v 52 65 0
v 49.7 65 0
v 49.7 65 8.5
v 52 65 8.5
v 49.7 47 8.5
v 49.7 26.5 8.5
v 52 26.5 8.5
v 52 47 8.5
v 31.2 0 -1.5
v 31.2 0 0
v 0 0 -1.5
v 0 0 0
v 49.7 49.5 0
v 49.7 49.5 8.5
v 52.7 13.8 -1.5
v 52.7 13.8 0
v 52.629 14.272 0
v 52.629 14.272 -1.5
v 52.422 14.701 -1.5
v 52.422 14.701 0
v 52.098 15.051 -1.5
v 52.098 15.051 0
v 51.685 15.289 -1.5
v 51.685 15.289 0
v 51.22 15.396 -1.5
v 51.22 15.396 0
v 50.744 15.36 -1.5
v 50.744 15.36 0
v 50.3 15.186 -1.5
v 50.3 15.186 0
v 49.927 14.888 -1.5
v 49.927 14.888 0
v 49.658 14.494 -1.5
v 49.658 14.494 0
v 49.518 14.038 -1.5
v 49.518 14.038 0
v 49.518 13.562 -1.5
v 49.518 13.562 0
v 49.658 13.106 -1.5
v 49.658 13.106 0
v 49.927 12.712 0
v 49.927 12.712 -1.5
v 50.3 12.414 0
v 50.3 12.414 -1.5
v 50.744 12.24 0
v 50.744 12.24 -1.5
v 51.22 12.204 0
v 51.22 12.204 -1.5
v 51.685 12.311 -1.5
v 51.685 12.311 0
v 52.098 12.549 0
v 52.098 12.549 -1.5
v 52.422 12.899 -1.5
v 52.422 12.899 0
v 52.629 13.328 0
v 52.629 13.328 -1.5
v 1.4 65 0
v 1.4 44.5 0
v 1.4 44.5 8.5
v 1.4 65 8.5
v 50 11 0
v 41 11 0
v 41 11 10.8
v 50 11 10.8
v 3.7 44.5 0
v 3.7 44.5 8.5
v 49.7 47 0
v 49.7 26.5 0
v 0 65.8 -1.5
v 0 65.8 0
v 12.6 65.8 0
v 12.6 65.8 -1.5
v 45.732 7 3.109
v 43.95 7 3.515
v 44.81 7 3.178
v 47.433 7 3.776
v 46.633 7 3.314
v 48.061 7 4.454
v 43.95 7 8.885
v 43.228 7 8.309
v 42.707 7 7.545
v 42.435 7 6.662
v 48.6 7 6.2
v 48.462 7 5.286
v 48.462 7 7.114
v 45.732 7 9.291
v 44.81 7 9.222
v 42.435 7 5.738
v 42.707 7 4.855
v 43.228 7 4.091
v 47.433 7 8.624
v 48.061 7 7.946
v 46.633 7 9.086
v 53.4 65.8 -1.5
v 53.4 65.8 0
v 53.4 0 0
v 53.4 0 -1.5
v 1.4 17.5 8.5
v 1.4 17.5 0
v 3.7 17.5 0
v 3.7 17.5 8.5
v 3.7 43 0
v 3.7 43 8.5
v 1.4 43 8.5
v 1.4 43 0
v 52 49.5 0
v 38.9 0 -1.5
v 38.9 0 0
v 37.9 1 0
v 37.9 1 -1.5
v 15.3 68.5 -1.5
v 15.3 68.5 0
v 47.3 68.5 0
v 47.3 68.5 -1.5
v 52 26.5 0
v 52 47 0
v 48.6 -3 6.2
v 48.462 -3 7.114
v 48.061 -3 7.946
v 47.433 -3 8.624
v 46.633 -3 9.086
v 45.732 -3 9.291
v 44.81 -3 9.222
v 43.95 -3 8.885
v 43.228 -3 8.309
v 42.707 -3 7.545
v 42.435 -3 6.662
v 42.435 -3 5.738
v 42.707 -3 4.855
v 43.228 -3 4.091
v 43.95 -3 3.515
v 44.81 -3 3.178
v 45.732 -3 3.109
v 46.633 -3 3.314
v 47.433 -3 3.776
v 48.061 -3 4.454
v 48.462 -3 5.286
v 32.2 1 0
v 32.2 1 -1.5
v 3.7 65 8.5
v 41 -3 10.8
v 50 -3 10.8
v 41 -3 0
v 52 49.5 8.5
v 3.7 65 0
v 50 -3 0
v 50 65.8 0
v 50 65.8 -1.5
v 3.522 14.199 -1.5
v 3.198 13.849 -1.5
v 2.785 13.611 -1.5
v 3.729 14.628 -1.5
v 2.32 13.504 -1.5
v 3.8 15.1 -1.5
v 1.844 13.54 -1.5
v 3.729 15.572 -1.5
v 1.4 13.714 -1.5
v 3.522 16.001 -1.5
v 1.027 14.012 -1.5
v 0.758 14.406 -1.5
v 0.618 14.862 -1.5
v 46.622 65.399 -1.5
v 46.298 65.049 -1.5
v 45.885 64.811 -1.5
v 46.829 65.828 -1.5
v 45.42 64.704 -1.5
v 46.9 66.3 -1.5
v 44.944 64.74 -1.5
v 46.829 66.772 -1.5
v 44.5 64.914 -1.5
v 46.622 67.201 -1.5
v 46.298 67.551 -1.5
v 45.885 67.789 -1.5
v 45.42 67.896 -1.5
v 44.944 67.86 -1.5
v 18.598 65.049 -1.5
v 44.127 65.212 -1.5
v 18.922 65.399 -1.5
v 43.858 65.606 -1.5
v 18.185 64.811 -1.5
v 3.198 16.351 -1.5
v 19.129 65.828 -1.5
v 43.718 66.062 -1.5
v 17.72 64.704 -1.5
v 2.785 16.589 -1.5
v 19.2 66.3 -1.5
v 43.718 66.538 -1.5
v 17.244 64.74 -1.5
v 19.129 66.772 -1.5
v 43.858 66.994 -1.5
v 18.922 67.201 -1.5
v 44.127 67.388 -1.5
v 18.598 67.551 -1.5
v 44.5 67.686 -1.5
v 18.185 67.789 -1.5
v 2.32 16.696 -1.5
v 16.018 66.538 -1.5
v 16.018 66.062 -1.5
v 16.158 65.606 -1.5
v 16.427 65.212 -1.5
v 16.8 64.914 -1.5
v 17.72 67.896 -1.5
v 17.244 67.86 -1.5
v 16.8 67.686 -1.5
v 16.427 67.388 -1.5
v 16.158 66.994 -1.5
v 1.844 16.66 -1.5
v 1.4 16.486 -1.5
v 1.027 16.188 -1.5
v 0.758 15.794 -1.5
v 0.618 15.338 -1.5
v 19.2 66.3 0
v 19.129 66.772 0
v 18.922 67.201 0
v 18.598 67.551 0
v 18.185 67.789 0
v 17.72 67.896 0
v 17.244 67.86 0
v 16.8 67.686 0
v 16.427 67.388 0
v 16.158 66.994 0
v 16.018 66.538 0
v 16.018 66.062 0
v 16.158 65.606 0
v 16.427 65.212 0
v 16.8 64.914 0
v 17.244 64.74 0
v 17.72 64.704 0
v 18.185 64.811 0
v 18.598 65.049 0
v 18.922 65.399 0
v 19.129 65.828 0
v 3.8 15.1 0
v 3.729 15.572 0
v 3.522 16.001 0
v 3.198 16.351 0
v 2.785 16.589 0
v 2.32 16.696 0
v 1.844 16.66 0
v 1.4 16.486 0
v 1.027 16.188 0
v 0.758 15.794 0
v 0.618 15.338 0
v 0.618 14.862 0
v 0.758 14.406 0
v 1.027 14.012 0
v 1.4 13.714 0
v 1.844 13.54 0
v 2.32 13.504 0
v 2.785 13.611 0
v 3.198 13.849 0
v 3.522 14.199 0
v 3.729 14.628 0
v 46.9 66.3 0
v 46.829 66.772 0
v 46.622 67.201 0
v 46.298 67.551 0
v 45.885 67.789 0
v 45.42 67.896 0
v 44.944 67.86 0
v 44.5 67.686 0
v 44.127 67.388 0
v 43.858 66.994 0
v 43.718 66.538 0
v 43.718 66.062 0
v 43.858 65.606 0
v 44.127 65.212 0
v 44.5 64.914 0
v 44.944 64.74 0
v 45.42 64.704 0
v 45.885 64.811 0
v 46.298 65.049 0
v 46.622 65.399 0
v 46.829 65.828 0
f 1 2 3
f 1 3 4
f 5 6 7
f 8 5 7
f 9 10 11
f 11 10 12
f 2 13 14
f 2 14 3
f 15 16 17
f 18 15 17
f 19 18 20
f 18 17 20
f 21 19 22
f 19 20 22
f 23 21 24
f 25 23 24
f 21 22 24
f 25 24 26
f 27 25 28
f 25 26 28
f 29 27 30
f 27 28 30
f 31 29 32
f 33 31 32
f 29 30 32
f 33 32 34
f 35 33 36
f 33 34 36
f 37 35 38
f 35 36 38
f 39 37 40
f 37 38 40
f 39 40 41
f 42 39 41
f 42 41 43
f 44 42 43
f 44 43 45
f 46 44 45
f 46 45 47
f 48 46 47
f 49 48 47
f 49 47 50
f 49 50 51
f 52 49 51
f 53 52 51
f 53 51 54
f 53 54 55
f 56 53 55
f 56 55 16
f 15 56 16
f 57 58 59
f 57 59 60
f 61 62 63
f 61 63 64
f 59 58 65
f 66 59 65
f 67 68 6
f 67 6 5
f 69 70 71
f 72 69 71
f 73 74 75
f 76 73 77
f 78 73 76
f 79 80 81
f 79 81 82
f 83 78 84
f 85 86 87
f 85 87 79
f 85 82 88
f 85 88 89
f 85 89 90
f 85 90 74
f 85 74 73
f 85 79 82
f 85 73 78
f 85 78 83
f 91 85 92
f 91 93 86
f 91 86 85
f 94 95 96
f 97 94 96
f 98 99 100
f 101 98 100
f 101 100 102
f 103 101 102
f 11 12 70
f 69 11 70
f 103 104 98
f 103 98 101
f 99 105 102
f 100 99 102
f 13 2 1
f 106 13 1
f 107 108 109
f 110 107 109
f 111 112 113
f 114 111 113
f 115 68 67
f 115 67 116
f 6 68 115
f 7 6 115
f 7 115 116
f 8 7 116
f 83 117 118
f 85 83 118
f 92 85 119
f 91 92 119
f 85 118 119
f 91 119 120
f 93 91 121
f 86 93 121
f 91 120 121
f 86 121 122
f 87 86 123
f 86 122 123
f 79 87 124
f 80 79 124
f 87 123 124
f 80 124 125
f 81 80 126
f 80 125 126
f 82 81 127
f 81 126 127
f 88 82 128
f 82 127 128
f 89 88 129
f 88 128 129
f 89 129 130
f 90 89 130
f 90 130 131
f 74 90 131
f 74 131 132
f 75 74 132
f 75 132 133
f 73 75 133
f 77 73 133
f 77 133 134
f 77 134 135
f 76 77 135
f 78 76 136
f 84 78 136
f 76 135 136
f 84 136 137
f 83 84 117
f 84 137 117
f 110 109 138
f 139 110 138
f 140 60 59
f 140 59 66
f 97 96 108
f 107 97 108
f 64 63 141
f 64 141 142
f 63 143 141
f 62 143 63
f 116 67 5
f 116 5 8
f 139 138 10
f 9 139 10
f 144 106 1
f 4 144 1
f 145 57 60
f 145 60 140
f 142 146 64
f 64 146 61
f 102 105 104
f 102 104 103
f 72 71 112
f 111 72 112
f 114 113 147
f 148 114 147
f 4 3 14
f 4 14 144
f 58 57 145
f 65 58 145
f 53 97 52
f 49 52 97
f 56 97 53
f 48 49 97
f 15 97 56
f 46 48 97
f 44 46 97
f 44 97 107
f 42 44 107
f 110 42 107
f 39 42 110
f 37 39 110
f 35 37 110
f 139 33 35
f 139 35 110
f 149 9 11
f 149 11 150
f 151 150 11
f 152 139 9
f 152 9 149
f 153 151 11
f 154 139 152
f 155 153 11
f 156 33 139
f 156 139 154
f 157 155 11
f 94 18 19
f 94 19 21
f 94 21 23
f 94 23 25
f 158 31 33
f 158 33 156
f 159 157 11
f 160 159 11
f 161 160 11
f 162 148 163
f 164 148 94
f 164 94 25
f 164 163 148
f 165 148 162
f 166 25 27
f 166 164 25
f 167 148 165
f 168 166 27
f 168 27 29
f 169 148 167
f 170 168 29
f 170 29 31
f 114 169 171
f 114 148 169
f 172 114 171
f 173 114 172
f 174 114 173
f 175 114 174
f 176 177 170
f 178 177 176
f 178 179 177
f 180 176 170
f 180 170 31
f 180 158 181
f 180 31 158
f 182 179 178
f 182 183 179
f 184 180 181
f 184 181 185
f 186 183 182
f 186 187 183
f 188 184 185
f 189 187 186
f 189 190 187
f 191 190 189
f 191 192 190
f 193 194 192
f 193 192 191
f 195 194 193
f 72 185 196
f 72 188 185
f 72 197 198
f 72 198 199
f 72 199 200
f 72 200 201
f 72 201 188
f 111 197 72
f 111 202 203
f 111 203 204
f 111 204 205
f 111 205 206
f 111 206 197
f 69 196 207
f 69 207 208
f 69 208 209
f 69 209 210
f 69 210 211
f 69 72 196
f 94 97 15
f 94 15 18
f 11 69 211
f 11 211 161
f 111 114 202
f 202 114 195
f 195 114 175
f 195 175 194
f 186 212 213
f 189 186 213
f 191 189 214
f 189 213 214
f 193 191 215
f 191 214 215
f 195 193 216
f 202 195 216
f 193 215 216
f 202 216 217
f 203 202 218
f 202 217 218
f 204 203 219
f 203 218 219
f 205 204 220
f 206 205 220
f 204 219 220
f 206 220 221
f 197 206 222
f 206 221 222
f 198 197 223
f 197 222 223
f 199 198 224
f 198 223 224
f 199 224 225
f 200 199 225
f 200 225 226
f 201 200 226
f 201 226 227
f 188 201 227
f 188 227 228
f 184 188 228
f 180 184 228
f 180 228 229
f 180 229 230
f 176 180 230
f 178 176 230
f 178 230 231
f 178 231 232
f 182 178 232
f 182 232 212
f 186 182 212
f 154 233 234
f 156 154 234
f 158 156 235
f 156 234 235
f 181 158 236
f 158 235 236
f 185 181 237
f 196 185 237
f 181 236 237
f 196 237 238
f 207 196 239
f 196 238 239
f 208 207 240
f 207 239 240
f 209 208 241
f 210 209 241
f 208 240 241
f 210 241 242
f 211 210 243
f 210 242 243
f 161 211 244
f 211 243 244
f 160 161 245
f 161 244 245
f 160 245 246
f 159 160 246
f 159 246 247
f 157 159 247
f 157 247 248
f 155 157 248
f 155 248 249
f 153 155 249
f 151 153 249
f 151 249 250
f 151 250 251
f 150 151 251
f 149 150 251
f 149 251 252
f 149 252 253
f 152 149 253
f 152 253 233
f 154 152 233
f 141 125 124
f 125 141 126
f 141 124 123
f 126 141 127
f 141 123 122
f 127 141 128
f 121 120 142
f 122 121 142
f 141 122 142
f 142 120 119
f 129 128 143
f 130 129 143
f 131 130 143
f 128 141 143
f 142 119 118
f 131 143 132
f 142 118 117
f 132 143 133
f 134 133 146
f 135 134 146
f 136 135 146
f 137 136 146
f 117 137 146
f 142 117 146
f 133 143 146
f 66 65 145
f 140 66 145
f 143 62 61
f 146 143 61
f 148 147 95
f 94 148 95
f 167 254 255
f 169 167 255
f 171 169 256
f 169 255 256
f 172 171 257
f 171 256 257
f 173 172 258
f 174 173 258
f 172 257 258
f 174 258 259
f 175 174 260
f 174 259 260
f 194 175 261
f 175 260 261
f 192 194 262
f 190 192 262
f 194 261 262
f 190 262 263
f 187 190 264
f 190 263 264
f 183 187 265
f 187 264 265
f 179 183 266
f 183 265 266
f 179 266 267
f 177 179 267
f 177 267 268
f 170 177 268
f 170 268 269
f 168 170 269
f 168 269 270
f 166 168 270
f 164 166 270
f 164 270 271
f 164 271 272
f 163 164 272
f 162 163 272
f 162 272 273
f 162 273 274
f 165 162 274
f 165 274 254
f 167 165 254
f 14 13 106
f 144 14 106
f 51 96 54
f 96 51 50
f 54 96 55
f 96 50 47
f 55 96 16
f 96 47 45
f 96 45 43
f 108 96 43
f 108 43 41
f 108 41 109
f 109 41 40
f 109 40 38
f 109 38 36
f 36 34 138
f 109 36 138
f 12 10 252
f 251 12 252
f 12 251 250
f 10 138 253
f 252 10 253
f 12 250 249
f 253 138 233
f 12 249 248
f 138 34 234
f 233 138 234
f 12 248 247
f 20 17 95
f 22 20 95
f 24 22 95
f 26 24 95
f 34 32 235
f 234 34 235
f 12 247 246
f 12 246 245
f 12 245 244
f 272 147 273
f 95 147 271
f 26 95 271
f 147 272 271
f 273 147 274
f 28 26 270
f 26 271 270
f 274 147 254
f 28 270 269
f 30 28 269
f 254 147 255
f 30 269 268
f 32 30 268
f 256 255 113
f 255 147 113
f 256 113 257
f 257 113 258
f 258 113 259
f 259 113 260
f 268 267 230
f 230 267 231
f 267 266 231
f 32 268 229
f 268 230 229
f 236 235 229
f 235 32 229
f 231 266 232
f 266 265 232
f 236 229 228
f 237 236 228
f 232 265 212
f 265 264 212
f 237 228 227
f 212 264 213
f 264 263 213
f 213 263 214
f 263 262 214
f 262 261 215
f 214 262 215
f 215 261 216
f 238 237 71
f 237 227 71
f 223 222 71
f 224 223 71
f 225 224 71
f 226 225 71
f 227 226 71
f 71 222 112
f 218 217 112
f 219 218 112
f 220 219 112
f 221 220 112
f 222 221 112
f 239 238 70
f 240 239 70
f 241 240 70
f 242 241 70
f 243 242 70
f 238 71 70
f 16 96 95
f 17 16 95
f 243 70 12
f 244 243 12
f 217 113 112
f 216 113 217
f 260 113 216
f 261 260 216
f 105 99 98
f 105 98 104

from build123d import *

# Parameters (mm, degrees)
PAD_DEPTH       = 1.5
SKETCH001_R     = 1.6
POCKET_DEPTH    = 1.501
SKETCH002_W     = 9
SKETCH002_H     = 14
PAD001_DEPTH    = 10.8
SKETCH003_R     = 3.1
POCKET001_DEPTH = 10
SKETCH004_W     = 2.3
SKETCH004_H     = 20.5
PAD002_DEPTH    = 8.5
SKETCH005_W     = 2.3
SKETCH005_H     = 25.5
PAD003_DEPTH    = 8.5
SKETCH006_W     = 2.3
SKETCH006_H     = 15.5
PAD004_DEPTH    = 8.5
SKETCH007_W     = 2.3
SKETCH007_H     = 20.5
PAD005_DEPTH    = 8.5


with BuildPart() as mainboard:
    # Sketch → Pad (new body)
    with BuildSketch(Plane.XY):
        Polygon((53.4, 65.8), (53.4, 0), (38.9, 0), (37.9, 1), (32.2, 1), (31.2, 0), (0, 0), (0, 65.8), (12.6, 65.8), (15.3, 68.5), (47.3, 68.5), (50, 65.8), align=None)
    extrude(amount=-PAD_DEPTH)

    # Sketch001 → Pocket (cut, through all)
    with BuildSketch(Plane.XY):
        with Locations((17.6, 66.3)):
            Circle(SKETCH001_R)
        with Locations((45.3, 66.3)):
            Circle(SKETCH001_R)
        with Locations((2.2, 15.1)):
            Circle(SKETCH001_R)
        with Locations((51.1, 13.8)):
            Circle(SKETCH001_R)
    extrude(amount=-POCKET_DEPTH, mode=Mode.SUBTRACT)


with BuildPart() as powerbarrel:
    # Sketch002 → Pad001 (new body)
    with BuildSketch(Plane.XY):
        with Locations((45.5, 4)):
            Rectangle(SKETCH002_W, SKETCH002_H)
    extrude(amount=PAD001_DEPTH)

    # Sketch003 (on Face3 of Pad001) → Pocket001 (cut)
    with BuildSketch(Plane.XZ.offset(3)):
        with Locations((45.5, 6.2)):
            Circle(SKETCH003_R)
    extrude(amount=-POCKET001_DEPTH, mode=Mode.SUBTRACT)


with BuildPart() as header1:
    # Sketch004 → Pad002 (new body)
    with BuildSketch(Plane.XY):
        with Locations((2.55, 54.75)):
            Rectangle(SKETCH004_W, SKETCH004_H)
    extrude(amount=PAD002_DEPTH)


with BuildPart() as header2:
    # Sketch005 → Pad003 (new body)
    with BuildSketch(Plane.XY):
        with Locations((2.55, 30.25)):
            Rectangle(SKETCH005_W, SKETCH005_H)
    extrude(amount=PAD003_DEPTH)


with BuildPart() as header3:
    # Sketch006 → Pad004 (new body)
    with BuildSketch(Plane.XY):
        with Locations((50.85, 57.25)):
            Rectangle(SKETCH006_W, SKETCH006_H)
    extrude(amount=PAD004_DEPTH)


with BuildPart() as header4:
    # Sketch007 → Pad005 (new body)
    with BuildSketch(Plane.XY):
        with Locations((50.85, 36.75)):
            Rectangle(SKETCH007_W, SKETCH007_H)
    extrude(amount=PAD005_DEPTH)


solid = Compound([mainboard.part, powerbarrel.part, header1.part, header2.part, header3.part, header4.part])
